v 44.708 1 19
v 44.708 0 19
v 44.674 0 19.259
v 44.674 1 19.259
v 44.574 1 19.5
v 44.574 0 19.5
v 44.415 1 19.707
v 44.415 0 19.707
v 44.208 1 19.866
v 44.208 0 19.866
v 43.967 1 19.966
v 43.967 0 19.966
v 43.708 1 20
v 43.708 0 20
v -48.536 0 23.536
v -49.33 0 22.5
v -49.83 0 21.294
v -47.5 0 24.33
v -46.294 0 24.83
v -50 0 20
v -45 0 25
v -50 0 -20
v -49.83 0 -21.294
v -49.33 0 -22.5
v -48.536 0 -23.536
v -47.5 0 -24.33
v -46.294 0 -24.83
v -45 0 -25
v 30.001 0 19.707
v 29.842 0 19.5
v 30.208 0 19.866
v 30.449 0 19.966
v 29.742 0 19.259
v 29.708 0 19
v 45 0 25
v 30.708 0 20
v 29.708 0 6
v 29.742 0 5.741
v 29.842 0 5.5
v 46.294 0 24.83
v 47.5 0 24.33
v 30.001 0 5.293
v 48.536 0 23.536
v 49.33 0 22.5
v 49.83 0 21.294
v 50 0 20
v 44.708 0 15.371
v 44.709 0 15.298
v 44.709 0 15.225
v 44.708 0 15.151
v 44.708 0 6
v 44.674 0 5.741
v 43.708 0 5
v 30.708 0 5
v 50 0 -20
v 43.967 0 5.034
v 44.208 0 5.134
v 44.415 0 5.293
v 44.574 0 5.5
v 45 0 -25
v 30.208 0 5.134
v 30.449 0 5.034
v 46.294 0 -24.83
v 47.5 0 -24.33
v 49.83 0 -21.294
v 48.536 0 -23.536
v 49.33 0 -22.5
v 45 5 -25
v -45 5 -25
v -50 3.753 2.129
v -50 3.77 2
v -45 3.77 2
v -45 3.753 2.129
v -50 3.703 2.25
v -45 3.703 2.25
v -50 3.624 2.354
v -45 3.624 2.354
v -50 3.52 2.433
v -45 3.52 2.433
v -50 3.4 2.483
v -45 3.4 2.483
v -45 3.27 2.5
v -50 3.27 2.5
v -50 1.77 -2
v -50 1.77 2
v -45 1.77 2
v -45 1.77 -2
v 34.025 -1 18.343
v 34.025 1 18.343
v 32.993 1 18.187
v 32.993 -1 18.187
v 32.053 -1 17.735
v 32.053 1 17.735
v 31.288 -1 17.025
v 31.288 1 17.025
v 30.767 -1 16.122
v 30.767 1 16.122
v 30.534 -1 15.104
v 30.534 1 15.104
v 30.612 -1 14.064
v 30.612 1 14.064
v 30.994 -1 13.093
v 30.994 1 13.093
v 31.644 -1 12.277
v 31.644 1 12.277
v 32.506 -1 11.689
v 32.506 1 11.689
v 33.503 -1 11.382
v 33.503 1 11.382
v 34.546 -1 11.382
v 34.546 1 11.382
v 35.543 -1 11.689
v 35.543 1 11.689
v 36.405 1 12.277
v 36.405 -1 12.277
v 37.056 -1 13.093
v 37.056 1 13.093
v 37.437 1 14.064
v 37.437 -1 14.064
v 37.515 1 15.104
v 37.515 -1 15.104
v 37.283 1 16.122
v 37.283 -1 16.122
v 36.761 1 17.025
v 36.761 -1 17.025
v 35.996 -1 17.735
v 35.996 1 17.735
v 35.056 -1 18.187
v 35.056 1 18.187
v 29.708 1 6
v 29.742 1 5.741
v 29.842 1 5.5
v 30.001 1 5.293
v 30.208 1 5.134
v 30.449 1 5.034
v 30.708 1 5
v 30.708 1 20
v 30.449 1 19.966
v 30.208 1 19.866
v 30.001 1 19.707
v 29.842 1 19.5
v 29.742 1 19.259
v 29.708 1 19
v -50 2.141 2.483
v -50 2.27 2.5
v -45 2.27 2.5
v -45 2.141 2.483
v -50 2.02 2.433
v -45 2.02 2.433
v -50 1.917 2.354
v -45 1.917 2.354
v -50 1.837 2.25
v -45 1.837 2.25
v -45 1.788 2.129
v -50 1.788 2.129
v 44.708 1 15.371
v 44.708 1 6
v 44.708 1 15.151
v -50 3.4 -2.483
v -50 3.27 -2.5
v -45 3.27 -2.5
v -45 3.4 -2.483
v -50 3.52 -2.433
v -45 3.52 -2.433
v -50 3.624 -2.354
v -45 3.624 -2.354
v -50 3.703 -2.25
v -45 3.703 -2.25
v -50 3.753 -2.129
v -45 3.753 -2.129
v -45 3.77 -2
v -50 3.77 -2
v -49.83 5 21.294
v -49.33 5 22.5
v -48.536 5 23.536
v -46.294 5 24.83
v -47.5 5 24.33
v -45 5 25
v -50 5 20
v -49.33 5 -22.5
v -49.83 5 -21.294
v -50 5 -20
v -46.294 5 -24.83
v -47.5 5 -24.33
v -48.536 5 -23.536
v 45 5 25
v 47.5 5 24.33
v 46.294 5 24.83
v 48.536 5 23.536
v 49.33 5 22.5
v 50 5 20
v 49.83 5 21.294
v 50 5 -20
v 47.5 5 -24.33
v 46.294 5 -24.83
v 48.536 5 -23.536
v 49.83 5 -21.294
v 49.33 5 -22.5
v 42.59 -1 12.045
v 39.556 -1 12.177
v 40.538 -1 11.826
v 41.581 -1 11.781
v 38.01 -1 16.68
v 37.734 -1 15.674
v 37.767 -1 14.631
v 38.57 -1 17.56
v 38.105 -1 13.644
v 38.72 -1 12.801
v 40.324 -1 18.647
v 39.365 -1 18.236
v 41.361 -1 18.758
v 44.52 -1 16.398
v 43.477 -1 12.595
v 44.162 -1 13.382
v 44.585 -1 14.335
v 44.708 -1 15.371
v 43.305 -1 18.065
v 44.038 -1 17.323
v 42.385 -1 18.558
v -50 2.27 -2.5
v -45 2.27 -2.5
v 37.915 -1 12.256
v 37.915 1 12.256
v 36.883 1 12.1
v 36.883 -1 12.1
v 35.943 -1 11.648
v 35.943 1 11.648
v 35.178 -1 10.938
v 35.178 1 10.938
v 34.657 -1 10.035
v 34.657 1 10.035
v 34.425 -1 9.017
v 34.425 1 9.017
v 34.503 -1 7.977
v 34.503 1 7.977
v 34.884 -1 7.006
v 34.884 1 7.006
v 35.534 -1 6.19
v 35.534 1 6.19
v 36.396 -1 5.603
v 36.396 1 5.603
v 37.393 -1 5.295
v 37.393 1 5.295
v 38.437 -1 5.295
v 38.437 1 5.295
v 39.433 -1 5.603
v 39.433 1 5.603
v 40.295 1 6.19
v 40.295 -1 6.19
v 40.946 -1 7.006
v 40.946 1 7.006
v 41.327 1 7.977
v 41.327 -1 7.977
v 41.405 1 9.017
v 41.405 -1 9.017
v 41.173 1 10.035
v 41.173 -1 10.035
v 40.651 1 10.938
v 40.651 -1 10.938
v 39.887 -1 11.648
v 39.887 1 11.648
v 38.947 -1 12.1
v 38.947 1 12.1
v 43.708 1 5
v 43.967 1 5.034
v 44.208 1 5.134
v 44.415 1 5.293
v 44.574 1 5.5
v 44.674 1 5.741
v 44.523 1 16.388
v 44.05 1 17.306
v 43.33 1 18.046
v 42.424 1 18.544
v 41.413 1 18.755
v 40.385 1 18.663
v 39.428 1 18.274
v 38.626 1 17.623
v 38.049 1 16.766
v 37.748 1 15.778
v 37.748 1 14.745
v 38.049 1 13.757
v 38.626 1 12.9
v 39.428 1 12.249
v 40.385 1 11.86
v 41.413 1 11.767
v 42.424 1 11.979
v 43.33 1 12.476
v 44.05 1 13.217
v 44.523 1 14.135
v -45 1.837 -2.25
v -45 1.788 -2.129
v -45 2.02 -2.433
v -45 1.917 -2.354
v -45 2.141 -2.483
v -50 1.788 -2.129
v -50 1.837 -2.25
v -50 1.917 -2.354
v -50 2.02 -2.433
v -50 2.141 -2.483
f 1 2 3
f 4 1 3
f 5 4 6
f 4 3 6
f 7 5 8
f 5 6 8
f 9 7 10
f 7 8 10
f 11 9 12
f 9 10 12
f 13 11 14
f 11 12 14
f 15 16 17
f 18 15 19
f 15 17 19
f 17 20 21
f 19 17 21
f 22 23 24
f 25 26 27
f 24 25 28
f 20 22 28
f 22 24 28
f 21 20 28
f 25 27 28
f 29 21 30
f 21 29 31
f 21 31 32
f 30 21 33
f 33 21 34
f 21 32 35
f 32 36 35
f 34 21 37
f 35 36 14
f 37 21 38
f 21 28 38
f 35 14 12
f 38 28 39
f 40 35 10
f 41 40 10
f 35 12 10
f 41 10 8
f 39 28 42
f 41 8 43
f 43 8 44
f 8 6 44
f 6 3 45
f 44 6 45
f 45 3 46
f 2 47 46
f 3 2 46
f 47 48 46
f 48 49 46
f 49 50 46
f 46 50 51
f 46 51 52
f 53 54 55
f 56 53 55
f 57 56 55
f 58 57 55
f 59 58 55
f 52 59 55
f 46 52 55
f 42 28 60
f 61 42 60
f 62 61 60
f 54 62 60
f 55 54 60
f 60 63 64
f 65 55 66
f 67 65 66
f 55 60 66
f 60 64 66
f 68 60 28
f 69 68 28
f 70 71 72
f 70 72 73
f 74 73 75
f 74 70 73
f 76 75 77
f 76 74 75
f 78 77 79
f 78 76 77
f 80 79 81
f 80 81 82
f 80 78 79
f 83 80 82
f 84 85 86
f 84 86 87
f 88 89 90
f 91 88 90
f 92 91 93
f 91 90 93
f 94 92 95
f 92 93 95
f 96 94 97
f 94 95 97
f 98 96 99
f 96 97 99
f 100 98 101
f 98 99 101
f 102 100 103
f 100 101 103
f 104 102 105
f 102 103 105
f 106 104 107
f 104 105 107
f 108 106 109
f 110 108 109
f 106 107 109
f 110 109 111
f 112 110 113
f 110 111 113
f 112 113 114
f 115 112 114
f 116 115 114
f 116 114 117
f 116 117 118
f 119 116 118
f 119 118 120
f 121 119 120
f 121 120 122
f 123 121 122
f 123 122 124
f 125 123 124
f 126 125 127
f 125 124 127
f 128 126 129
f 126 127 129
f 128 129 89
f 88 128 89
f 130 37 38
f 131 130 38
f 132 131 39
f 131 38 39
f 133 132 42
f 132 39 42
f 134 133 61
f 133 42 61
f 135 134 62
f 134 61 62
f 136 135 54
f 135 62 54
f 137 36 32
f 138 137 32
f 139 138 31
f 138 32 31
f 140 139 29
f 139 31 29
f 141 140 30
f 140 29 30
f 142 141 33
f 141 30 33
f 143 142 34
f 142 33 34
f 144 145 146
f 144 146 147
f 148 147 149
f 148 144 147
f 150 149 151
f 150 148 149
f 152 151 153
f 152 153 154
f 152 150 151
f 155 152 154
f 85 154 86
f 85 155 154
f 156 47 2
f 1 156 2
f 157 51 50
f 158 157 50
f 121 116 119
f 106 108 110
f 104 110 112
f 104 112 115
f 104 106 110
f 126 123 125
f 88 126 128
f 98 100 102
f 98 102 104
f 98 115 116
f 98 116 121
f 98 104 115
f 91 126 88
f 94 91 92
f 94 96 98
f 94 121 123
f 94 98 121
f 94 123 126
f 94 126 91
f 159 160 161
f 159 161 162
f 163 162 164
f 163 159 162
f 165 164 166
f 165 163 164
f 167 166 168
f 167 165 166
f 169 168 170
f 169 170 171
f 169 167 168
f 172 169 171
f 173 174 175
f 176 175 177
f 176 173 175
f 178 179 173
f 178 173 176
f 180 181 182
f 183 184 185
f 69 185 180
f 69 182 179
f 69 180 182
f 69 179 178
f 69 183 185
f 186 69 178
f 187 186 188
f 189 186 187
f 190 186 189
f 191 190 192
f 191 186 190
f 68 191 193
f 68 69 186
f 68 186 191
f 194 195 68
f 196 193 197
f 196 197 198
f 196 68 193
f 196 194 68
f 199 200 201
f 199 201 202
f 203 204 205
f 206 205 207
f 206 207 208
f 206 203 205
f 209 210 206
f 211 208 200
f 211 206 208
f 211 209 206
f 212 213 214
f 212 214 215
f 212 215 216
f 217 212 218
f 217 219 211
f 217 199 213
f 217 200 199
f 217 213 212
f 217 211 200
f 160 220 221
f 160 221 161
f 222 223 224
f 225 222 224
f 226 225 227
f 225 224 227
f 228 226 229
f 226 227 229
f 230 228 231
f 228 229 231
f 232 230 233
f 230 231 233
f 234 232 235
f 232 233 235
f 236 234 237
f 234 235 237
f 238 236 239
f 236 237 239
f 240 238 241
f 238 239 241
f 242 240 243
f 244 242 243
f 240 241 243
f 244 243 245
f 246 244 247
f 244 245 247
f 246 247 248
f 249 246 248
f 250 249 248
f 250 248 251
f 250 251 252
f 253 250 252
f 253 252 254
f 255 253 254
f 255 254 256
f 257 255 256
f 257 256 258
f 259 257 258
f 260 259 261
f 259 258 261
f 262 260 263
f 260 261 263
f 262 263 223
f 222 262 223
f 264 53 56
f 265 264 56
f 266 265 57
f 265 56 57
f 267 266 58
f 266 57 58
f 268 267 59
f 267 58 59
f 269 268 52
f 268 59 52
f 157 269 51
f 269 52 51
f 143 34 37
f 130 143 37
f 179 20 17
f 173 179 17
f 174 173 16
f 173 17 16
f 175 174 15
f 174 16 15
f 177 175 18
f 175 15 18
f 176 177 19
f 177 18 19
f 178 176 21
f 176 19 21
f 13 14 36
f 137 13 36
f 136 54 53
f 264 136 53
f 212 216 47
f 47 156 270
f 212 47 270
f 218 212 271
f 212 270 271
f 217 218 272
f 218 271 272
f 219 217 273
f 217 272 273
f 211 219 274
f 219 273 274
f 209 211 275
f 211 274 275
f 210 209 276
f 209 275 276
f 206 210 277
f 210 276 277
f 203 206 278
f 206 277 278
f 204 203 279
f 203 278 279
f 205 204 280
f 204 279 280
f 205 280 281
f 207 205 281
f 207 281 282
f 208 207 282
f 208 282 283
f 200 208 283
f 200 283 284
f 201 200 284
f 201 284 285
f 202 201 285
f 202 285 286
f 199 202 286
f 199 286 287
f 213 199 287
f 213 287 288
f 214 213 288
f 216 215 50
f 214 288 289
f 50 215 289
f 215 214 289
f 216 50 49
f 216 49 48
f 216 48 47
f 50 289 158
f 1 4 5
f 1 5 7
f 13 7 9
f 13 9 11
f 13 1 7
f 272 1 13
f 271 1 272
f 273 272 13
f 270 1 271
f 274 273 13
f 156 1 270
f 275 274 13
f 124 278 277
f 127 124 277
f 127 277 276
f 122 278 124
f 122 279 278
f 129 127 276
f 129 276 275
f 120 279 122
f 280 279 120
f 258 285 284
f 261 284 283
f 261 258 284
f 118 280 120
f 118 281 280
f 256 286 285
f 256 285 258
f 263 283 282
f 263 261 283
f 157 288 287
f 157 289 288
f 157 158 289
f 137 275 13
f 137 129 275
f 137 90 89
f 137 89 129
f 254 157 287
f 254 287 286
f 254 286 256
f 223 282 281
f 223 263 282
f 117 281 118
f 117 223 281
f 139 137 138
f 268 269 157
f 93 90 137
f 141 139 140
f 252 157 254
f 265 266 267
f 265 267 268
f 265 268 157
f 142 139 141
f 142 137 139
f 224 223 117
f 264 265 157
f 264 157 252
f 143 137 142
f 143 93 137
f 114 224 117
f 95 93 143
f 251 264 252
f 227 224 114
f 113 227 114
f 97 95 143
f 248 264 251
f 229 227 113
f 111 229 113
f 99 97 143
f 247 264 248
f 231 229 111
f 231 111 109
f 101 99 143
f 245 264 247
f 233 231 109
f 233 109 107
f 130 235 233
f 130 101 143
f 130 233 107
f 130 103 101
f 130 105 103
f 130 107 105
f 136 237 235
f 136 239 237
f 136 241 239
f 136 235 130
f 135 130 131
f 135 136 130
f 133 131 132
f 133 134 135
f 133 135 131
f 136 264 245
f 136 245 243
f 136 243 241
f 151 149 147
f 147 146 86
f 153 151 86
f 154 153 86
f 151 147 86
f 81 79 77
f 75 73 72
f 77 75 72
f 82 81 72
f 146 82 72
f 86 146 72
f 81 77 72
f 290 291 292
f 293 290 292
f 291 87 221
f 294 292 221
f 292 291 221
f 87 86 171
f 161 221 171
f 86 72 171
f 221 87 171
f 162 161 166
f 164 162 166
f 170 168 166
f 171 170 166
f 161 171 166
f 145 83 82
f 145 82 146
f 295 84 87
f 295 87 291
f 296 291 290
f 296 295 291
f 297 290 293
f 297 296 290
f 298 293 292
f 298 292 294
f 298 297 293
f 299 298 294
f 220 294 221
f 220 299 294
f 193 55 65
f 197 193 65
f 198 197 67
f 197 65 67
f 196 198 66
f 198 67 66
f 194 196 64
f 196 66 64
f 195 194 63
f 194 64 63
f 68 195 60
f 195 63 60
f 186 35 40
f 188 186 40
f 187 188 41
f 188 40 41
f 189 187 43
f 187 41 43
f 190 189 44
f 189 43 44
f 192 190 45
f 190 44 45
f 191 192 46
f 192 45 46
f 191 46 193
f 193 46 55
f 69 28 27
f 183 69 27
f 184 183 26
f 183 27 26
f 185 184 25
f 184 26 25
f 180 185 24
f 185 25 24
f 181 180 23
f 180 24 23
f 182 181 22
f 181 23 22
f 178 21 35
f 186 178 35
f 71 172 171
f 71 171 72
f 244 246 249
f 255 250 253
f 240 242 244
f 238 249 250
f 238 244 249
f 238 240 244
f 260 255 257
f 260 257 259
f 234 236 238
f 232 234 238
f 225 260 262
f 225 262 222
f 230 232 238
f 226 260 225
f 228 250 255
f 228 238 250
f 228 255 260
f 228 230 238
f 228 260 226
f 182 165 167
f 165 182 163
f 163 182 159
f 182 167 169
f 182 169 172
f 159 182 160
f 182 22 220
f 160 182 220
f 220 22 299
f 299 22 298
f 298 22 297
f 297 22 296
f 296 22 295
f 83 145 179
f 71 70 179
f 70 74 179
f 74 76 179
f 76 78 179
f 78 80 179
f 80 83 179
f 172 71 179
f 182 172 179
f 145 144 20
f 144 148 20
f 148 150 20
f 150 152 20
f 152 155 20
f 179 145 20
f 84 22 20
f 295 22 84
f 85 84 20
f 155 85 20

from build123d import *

# Parameters (mm, degrees)
BOSS_EXTRUDE1_DEPTH = 5
CUT_EXTRUDE1_DEPTH  = 1
SKETCH3_R           = 3.5
BOSS_EXTRUDE2_DEPTH = 2
CUT_EXTRUDE2_DEPTH  = 5


with BuildPart() as part:
    # Sketch1 → Boss-Extrude1 (new body)
    with BuildSketch(Plane(origin=(0, 0, 0), x_dir=(1, 0, 0), z_dir=(0, 1, 0))):
        with BuildLine():
            Line((-45, -25), (45, -25))
            ThreePointArc((45, -25), (48.535533906, -23.535533906), (50, -20))
            Line((50, -20), (50, 20))
            ThreePointArc((50, 20), (48.535533906, 23.535533906), (45, 25))
            Line((45, 25), (-45, 25))
            ThreePointArc((-45, 25), (-48.535533906, 23.535533906), (-50, 20))
            Line((-50, 20), (-50, -20))
            ThreePointArc((-50, -20), (-48.535533906, -23.535533906), (-45, -25))
        make_face()
    extrude(amount=BOSS_EXTRUDE1_DEPTH)

    # Sketch2 → Cut-Extrude1 (cut)
    with BuildSketch(Plane(origin=(0, 0, 0), x_dir=(-1, 0, 0), z_dir=(0, -1, 0))):
        with BuildLine():
            Line((-43.707715382, -20), (-30.707715382, -20))
            ThreePointArc((-30.707715382, -20), (-30.0006086, -19.707106781), (-29.707715382, -19))
            Line((-29.707715382, -19), (-29.707715382, -6))
            ThreePointArc((-29.707715382, -6), (-30.0006086, -5.292893219), (-30.707715382, -5))
            Line((-30.707715382, -5), (-43.707715382, -5))
            ThreePointArc((-43.707715382, -5), (-44.414822163, -5.292893219), (-44.707715382, -6))
            Line((-44.707715382, -6), (-44.707715382, -19))
            ThreePointArc((-44.707715382, -19), (-44.414822163, -19.707106781), (-43.707715382, -20))
        make_face()
    extrude(amount=-CUT_EXTRUDE1_DEPTH, mode=Mode.SUBTRACT)

    # Sketch3 → Boss-Extrude2 (add)
    with BuildSketch(Plane(origin=(0, 1, 0), x_dir=(-1, 0, 0), z_dir=(0, -1, 0))):
        with Locations(Location((-37.914895337, -8.755915312, 0), (0, 0, 270))):
            Circle(SKETCH3_R)
        with Locations(Location((-34.024612955, -14.842826033, 0), (0, 0, 270))):
            Circle(SKETCH3_R)
        with Locations(Location((-41.209446078, -15.261216115, 0), (0, 0, 181.801905024))):
            Circle(SKETCH3_R)
    extrude(amount=BOSS_EXTRUDE2_DEPTH)

    # Sketch4 → Cut-Extrude2 (cut)
    with BuildSketch(Plane.ZY.offset(50)):
        with BuildLine():
            Line((2, 1.770486386), (-2, 1.770486386))
            ThreePointArc((-2, 1.770486386), (-2.353553391, 1.916932996), (-2.5, 2.270486386))
            Line((-2.5, 2.270486386), (-2.5, 3.270486386))
            ThreePointArc((-2.5, 3.270486386), (-2.353553391, 3.624039777), (-2, 3.770486386))
            Line((-2, 3.770486386), (2, 3.770486386))
            ThreePointArc((2, 3.770486386), (2.353553391, 3.624039777), (2.5, 3.270486386))
            Line((2.5, 3.270486386), (2.5, 2.270486386))
            ThreePointArc((2.5, 2.270486386), (2.353553391, 1.916932996), (2, 1.770486386))
        make_face()
    extrude(amount=-CUT_EXTRUDE2_DEPTH, mode=Mode.SUBTRACT)


solid = part.part
